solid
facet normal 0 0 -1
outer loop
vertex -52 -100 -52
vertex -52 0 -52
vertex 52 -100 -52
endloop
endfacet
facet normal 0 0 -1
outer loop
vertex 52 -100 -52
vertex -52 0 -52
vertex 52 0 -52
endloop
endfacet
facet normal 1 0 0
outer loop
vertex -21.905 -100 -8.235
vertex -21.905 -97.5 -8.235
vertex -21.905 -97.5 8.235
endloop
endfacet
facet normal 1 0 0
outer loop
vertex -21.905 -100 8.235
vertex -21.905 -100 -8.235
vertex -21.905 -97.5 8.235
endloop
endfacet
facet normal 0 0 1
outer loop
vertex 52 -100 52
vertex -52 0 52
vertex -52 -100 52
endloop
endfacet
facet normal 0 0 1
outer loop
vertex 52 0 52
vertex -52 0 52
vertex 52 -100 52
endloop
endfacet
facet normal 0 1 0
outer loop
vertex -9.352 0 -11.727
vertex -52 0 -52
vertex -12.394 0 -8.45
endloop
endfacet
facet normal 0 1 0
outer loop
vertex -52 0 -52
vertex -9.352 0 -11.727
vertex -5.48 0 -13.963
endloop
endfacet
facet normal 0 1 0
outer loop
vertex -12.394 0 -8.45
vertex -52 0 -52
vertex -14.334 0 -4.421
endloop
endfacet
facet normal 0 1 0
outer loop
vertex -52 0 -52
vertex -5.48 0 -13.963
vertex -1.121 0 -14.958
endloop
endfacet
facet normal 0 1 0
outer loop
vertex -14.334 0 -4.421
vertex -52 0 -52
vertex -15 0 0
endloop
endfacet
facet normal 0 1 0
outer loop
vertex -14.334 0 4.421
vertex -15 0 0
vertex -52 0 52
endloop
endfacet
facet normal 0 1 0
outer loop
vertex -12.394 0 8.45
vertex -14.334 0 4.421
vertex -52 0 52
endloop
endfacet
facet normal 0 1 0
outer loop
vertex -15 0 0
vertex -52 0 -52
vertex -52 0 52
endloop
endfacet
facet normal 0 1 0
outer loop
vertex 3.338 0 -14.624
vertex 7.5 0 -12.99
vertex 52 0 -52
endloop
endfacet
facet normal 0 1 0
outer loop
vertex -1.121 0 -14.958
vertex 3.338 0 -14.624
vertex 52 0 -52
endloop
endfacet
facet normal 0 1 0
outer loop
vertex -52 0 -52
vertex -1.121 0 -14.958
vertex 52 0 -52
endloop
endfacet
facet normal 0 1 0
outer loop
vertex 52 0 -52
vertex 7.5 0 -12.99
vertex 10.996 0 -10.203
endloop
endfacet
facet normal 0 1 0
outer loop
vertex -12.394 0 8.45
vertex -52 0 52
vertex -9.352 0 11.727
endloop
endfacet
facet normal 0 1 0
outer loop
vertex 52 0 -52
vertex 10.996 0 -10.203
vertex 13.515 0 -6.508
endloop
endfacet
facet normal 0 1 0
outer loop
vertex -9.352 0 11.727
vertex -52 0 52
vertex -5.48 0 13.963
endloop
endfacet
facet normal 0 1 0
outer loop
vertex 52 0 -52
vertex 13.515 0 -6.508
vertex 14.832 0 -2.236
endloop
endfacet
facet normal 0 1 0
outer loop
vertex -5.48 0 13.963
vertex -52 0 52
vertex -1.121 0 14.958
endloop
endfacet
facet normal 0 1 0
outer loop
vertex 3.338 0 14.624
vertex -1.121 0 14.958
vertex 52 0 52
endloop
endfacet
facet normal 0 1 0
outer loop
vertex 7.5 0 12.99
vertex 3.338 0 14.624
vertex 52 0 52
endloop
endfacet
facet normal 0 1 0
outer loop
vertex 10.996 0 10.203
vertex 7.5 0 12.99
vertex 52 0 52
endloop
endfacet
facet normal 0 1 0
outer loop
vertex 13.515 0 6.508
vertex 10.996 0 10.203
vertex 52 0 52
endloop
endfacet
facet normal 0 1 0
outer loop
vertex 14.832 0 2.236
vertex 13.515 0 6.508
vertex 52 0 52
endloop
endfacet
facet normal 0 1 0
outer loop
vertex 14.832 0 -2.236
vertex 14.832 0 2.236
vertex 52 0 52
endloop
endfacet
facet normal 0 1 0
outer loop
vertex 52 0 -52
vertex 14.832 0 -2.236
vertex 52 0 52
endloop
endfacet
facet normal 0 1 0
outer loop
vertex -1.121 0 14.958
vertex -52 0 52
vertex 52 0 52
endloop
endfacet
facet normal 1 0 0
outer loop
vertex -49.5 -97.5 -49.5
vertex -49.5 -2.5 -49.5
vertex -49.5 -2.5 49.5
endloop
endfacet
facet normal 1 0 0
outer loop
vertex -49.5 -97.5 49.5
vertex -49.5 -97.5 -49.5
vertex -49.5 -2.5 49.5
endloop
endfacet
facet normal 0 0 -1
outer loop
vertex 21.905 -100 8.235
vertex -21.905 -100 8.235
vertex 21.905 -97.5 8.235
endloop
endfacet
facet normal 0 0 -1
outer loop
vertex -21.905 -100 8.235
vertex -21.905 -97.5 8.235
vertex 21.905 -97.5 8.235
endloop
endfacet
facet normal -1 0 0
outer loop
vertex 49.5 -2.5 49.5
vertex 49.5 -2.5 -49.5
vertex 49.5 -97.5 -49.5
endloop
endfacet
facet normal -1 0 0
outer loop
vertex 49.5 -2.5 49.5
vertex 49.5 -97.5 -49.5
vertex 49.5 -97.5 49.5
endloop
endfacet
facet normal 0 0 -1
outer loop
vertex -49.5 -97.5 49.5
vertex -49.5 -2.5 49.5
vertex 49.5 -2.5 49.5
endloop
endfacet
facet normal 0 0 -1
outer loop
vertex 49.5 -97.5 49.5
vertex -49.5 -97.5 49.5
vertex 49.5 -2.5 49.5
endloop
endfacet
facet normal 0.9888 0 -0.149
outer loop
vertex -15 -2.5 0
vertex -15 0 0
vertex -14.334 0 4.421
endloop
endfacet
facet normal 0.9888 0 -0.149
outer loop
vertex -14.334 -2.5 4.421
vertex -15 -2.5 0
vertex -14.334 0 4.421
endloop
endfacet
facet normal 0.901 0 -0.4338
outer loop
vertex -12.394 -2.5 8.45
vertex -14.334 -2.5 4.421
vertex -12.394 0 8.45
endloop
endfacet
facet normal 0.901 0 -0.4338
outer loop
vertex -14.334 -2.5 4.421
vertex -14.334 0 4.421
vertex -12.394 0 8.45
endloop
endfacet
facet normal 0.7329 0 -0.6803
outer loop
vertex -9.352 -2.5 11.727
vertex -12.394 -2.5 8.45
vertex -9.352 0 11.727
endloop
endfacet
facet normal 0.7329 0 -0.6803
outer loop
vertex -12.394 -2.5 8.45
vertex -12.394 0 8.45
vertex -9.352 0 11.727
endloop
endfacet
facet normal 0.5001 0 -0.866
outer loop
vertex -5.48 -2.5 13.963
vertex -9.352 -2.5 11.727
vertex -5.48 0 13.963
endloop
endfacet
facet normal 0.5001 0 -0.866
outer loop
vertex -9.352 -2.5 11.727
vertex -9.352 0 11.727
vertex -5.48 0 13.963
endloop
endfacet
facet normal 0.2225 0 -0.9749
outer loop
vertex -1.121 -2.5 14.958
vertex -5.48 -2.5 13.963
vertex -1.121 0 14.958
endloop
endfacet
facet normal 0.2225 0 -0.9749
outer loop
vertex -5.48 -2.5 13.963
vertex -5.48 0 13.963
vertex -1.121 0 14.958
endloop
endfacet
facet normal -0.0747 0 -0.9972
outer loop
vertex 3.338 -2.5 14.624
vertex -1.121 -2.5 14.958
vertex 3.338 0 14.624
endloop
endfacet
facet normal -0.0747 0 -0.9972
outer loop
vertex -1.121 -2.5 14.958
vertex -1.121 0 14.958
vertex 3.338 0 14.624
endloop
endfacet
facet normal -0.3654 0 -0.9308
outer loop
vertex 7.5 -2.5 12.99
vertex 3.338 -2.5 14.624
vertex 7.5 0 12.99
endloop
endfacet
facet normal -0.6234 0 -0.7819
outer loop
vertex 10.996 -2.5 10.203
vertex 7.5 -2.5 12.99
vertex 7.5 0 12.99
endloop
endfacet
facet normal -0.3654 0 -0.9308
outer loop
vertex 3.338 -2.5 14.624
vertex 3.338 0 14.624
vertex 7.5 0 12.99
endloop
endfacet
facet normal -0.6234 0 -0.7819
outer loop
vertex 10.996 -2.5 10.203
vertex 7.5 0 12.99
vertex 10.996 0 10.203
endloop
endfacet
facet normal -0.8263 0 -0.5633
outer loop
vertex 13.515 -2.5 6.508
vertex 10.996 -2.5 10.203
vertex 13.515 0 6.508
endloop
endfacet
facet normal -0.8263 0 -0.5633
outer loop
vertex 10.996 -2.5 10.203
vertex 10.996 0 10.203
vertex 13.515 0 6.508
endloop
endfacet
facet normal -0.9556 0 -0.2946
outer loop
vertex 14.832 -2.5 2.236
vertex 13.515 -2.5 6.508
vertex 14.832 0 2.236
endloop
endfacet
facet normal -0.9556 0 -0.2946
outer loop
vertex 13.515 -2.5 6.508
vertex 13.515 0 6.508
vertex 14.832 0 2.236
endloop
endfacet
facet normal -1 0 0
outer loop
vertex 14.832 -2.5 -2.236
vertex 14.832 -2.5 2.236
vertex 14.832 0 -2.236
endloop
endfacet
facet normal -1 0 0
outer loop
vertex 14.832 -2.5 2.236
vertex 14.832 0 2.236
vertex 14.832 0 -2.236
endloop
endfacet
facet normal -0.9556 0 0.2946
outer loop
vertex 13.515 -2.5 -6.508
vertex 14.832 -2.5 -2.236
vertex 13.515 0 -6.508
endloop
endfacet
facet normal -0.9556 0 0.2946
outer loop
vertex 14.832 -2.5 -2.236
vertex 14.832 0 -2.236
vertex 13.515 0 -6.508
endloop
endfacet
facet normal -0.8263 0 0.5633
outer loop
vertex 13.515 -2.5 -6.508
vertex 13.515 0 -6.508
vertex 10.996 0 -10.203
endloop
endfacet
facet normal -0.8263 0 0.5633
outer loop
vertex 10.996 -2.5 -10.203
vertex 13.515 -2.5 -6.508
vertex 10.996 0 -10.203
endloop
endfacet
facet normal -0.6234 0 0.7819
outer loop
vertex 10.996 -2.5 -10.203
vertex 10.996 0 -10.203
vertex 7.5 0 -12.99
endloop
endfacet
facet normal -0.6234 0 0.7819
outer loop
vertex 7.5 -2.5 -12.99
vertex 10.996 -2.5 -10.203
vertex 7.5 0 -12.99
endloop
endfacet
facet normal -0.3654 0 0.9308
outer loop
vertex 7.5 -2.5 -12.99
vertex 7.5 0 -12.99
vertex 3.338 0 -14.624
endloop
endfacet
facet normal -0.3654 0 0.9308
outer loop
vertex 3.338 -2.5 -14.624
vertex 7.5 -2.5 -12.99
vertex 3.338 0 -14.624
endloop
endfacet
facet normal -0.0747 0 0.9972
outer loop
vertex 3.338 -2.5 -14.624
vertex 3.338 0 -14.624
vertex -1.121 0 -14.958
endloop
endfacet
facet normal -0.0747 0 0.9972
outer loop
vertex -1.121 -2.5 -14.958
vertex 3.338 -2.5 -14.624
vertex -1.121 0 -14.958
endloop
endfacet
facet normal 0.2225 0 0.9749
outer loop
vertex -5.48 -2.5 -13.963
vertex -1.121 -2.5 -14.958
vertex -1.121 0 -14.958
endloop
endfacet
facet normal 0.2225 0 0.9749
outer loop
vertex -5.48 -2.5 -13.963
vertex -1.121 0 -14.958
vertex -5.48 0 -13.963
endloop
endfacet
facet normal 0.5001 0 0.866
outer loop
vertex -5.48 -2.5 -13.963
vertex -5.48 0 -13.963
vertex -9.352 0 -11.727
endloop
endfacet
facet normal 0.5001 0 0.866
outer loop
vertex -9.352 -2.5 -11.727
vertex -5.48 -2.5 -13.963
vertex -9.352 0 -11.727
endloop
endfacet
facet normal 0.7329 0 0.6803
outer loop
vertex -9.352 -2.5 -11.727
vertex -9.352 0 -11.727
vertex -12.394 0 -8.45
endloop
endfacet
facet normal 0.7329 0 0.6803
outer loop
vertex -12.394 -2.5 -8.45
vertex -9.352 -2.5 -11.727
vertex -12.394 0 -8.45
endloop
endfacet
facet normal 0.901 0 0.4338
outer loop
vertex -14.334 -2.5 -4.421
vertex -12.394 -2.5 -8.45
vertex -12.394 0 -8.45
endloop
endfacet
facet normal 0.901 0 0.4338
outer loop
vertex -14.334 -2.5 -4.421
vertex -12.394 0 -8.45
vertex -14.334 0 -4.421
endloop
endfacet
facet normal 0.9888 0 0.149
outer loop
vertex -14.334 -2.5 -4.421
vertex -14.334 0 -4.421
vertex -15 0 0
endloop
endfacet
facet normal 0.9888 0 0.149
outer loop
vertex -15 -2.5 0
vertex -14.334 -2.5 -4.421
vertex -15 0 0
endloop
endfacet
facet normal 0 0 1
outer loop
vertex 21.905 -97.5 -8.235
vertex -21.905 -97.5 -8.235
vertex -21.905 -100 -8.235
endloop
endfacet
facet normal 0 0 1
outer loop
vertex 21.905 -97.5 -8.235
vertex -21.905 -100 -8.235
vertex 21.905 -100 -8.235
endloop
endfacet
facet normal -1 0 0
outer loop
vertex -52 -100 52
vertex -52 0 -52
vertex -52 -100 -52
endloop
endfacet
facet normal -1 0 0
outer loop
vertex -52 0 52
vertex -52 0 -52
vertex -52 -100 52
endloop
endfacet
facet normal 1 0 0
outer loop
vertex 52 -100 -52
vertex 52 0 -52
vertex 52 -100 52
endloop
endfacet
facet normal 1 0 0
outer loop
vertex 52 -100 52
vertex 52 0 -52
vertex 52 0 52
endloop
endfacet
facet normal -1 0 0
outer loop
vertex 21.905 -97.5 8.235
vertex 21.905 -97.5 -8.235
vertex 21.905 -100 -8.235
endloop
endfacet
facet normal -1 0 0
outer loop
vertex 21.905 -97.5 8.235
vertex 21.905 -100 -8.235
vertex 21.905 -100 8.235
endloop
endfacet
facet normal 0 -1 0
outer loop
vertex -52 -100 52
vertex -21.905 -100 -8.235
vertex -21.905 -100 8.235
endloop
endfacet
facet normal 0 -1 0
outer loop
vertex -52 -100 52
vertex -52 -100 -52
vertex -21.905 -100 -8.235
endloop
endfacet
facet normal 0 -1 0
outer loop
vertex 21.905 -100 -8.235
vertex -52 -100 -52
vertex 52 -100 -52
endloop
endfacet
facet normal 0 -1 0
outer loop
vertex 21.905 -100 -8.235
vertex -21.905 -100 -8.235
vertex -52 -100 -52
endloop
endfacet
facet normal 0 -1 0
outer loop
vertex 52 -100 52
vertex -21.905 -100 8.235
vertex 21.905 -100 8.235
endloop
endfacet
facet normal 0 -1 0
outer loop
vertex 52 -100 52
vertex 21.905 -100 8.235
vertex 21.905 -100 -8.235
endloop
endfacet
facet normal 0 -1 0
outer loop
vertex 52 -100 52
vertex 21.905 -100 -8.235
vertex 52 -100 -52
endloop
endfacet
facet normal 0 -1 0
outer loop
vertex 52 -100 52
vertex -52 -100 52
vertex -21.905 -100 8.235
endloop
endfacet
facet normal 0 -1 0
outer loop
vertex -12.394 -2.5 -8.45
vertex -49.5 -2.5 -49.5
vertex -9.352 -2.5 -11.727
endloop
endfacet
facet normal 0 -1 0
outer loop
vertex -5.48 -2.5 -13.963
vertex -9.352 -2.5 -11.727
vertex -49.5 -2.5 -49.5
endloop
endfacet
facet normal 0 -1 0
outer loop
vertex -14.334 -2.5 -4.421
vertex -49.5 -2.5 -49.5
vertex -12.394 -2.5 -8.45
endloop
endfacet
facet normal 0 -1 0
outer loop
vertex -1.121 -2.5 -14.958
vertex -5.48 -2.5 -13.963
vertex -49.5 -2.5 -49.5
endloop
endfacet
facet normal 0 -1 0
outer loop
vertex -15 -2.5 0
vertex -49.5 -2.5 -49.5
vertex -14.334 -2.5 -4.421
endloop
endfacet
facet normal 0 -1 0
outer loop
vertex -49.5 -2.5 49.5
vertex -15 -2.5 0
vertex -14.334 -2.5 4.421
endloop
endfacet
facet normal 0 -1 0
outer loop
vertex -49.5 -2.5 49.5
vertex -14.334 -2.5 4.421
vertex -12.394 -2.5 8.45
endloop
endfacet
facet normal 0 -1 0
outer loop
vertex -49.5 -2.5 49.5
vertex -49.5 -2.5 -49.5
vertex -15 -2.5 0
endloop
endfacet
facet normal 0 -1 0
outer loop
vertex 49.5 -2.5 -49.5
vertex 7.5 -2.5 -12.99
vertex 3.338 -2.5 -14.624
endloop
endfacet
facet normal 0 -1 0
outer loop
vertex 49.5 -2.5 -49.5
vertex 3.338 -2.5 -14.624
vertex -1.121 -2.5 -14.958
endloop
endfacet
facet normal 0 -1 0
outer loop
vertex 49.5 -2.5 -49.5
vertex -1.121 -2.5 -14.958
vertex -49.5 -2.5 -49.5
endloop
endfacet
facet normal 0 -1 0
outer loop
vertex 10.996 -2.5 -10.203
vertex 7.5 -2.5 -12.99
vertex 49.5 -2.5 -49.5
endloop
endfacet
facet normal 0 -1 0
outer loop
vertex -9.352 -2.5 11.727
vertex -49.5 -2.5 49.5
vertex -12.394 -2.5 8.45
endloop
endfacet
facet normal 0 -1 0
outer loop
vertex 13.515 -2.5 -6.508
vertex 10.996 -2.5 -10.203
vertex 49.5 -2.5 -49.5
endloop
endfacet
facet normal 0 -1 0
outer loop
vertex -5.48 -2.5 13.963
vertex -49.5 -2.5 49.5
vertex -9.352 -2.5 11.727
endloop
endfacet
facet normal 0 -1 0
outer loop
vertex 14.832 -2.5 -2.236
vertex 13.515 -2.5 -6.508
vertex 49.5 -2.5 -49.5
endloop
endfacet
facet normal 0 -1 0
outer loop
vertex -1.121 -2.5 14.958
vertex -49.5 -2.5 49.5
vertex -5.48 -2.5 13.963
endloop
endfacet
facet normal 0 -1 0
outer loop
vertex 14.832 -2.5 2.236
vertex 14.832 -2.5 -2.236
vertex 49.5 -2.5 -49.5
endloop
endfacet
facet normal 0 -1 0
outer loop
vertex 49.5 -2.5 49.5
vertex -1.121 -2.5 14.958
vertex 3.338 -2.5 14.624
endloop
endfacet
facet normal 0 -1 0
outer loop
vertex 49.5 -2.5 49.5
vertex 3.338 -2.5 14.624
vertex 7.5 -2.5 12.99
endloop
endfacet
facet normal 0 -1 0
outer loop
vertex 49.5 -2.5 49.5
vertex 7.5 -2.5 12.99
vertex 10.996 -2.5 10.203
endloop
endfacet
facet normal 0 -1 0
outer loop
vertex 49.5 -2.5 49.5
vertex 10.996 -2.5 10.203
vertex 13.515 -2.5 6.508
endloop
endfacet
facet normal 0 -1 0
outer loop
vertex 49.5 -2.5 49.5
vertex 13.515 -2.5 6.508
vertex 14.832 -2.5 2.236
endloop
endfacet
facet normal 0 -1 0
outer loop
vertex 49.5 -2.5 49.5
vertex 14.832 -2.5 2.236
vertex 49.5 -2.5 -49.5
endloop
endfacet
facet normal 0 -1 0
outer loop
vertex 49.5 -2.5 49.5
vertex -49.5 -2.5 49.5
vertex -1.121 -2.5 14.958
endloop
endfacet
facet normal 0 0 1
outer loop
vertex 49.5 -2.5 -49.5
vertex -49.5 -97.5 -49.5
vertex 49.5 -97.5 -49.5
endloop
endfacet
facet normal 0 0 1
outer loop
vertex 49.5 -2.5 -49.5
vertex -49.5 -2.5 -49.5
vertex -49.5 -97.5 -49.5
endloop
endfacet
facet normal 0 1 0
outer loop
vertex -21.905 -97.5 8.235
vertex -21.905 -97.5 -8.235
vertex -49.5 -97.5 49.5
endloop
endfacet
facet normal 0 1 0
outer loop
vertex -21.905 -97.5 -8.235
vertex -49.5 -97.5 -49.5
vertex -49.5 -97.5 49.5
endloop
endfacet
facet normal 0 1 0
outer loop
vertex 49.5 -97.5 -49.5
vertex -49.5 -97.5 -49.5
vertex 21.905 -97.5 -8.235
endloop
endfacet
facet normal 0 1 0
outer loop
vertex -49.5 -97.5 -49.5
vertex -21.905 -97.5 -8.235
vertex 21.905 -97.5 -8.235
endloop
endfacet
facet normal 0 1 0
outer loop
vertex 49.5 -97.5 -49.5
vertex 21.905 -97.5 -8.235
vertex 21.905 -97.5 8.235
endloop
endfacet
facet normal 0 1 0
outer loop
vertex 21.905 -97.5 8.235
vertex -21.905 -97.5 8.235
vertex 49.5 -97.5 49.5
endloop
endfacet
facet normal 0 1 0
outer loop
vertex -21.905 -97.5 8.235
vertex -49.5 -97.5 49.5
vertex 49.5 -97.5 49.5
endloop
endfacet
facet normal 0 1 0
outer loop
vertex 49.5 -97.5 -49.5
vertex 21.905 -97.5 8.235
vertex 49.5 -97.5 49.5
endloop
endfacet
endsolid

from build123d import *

# Parameters (mm, degrees)
F0_W     = 104
F0_H     = 104
F0_W_2   = 43.8093654811
F0_H_2   = 16.4691451937
F1_DEPTH = 100
F2_DEPTH = 5
F3_T     = -2.5
F4_R     = 15
F5_DEPTH = 25


with BuildPart() as f1:
    # F0 (on Front) → F1 (new body)
    with BuildSketch(Plane.XZ):
        Rectangle(F0_W, F0_H)
        Rectangle(F0_W_2, F0_H_2, mode=Mode.SUBTRACT)
    extrude(amount=F1_DEPTH)

    # F0 (on Front) → F2 (join)
    with BuildSketch(Plane.XZ):
        Rectangle(F0_W_2, F0_H_2)
    extrude(amount=F2_DEPTH)

    # F3
    f3_openings = [f1.faces().sort_by_distance(p)[0] for p in [
        (0, -52.5, -8.234573),
        (21.904683, -52.5, 0),
        (0, -52.5, 8.234573),
        (-21.904683, -52.5, 0),
        (0, -5, 0),
    ]]
    offset(amount=F3_T, openings=f3_openings)

    # F4 (on face) → F5 (cut)
    with BuildSketch(Plane(origin=(0, 0, 0), x_dir=(-1, 0, 0), z_dir=(0, 1, 0))):
        Circle(F4_R)
    extrude(amount=-F5_DEPTH, mode=Mode.SUBTRACT)


solid = f1.part
